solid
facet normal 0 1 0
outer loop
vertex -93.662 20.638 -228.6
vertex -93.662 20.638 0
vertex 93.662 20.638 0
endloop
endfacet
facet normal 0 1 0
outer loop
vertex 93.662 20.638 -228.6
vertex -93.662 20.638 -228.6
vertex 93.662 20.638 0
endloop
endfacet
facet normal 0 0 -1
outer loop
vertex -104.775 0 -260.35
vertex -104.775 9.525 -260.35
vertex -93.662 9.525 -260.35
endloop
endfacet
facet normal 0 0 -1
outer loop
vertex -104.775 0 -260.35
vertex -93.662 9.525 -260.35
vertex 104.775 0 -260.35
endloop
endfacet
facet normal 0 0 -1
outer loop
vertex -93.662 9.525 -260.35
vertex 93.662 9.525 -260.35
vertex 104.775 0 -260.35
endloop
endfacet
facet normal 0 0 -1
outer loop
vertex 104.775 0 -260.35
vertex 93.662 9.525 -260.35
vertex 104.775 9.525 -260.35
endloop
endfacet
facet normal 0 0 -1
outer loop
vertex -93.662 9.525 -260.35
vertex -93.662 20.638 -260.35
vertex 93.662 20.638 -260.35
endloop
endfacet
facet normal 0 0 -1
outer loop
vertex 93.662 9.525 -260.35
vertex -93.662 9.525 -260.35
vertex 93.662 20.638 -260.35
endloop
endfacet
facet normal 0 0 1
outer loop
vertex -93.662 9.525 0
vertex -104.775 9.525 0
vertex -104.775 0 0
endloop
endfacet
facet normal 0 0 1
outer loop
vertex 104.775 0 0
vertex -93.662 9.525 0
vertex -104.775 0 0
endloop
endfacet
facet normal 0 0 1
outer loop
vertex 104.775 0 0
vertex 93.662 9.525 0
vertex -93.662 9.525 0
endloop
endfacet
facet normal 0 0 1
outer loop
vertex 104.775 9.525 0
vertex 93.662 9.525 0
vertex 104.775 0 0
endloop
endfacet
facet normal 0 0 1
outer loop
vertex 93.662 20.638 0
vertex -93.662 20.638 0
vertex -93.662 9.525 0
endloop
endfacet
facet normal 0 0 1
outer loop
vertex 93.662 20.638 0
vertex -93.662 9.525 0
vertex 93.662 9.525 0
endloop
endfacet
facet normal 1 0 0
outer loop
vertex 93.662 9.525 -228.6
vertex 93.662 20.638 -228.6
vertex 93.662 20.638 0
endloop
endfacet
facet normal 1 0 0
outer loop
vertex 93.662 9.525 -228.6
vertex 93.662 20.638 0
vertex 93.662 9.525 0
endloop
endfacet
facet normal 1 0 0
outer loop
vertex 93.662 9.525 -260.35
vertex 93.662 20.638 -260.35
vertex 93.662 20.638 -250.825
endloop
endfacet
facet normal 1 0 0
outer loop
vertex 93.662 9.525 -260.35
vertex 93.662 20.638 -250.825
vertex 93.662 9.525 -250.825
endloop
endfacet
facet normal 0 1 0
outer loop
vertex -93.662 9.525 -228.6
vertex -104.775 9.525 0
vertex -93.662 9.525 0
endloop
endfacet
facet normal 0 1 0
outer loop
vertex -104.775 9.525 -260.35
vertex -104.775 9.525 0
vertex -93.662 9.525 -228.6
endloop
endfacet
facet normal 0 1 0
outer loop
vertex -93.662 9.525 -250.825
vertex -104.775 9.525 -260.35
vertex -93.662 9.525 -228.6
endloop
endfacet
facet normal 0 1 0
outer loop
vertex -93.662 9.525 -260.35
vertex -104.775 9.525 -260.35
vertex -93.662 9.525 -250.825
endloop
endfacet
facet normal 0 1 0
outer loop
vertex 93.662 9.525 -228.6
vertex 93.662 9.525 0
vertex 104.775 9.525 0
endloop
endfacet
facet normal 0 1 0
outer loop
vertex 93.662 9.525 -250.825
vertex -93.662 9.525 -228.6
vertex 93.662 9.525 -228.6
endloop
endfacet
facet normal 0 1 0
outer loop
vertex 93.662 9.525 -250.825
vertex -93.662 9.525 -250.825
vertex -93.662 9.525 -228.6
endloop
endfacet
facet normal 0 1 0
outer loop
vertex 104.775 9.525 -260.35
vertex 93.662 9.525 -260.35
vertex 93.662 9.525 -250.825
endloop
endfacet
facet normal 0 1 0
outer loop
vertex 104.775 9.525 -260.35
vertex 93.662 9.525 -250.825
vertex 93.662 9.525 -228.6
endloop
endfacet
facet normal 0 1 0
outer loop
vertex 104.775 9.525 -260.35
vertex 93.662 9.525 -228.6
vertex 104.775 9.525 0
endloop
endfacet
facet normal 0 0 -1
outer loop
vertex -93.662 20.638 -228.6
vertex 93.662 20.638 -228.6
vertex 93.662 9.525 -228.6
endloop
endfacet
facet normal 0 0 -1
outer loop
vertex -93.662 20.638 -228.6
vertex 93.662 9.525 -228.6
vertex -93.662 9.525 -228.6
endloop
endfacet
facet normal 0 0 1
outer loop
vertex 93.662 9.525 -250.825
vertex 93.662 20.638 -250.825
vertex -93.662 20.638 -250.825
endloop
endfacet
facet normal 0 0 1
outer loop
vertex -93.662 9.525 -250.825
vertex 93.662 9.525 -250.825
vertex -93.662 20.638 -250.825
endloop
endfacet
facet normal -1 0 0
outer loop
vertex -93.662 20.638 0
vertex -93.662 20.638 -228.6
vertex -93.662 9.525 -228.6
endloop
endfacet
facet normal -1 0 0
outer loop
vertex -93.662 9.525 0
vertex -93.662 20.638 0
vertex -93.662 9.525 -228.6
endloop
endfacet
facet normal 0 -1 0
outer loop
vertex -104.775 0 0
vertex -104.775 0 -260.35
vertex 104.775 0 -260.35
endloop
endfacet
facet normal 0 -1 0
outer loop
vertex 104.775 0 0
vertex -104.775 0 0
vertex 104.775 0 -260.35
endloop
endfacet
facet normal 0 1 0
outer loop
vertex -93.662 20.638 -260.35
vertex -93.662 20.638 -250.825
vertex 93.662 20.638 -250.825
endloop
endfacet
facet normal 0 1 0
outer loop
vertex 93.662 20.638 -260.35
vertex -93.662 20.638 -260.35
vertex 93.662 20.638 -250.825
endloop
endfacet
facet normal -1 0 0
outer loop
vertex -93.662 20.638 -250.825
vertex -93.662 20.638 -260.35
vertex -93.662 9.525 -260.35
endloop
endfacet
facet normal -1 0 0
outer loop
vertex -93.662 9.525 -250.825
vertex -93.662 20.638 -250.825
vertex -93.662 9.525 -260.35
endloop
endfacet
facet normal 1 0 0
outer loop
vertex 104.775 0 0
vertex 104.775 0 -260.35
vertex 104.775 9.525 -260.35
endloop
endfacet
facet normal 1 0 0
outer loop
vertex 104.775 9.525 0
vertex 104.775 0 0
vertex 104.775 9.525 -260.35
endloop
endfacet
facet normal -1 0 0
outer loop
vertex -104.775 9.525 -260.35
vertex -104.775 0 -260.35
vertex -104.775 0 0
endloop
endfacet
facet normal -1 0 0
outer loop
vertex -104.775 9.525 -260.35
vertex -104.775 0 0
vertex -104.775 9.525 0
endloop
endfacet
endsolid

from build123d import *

# Parameters (mm, degrees)
F0_W     = 209.55
F0_H     = 20.6375
F1_DEPTH = 260.35
F2_W     = 209.55
F2_H     = 22.225
F3_DEPTH = 11.1125
F4_W     = 11.1125
F4_H     = 11.1125
F5_DEPTH = 260.351


# Not quite as in the source:
# - a length typed as a fraction of an inch, garbled in the dataset ("3 / 203.2 mm" for 3/8 in), is restored


with BuildPart() as f1:
    # F0 (on Top) → F1 (new body)
    with BuildSketch(Plane.XY):
        with Locations((0, 10.31875)):
            Rectangle(F0_W, F0_H)
    extrude(amount=-F1_DEPTH)

    # F2 (on face) → F3 (cut)
    with BuildSketch(Plane(origin=(0, 20.6375, 0), x_dir=(-1, 0, 0), z_dir=(0, 1, 0))):
        with Locations((0, -239.7125)):
            Rectangle(F2_W, F2_H)
    extrude(amount=-F3_DEPTH, mode=Mode.SUBTRACT)

    # F4 (on face) → F5 (cut, through all)
    with BuildSketch(Plane(origin=(0, 0, -260.35), x_dir=(1, 0, 0), z_dir=(0, 0, -1))):
        with Locations((-99.21875, -15.08125)):
            Rectangle(F4_W, F4_H)
        with Locations((99.21875, -15.08125)):
            Rectangle(F4_W, F4_H)
    extrude(amount=-F5_DEPTH, mode=Mode.SUBTRACT)


solid = f1.part
